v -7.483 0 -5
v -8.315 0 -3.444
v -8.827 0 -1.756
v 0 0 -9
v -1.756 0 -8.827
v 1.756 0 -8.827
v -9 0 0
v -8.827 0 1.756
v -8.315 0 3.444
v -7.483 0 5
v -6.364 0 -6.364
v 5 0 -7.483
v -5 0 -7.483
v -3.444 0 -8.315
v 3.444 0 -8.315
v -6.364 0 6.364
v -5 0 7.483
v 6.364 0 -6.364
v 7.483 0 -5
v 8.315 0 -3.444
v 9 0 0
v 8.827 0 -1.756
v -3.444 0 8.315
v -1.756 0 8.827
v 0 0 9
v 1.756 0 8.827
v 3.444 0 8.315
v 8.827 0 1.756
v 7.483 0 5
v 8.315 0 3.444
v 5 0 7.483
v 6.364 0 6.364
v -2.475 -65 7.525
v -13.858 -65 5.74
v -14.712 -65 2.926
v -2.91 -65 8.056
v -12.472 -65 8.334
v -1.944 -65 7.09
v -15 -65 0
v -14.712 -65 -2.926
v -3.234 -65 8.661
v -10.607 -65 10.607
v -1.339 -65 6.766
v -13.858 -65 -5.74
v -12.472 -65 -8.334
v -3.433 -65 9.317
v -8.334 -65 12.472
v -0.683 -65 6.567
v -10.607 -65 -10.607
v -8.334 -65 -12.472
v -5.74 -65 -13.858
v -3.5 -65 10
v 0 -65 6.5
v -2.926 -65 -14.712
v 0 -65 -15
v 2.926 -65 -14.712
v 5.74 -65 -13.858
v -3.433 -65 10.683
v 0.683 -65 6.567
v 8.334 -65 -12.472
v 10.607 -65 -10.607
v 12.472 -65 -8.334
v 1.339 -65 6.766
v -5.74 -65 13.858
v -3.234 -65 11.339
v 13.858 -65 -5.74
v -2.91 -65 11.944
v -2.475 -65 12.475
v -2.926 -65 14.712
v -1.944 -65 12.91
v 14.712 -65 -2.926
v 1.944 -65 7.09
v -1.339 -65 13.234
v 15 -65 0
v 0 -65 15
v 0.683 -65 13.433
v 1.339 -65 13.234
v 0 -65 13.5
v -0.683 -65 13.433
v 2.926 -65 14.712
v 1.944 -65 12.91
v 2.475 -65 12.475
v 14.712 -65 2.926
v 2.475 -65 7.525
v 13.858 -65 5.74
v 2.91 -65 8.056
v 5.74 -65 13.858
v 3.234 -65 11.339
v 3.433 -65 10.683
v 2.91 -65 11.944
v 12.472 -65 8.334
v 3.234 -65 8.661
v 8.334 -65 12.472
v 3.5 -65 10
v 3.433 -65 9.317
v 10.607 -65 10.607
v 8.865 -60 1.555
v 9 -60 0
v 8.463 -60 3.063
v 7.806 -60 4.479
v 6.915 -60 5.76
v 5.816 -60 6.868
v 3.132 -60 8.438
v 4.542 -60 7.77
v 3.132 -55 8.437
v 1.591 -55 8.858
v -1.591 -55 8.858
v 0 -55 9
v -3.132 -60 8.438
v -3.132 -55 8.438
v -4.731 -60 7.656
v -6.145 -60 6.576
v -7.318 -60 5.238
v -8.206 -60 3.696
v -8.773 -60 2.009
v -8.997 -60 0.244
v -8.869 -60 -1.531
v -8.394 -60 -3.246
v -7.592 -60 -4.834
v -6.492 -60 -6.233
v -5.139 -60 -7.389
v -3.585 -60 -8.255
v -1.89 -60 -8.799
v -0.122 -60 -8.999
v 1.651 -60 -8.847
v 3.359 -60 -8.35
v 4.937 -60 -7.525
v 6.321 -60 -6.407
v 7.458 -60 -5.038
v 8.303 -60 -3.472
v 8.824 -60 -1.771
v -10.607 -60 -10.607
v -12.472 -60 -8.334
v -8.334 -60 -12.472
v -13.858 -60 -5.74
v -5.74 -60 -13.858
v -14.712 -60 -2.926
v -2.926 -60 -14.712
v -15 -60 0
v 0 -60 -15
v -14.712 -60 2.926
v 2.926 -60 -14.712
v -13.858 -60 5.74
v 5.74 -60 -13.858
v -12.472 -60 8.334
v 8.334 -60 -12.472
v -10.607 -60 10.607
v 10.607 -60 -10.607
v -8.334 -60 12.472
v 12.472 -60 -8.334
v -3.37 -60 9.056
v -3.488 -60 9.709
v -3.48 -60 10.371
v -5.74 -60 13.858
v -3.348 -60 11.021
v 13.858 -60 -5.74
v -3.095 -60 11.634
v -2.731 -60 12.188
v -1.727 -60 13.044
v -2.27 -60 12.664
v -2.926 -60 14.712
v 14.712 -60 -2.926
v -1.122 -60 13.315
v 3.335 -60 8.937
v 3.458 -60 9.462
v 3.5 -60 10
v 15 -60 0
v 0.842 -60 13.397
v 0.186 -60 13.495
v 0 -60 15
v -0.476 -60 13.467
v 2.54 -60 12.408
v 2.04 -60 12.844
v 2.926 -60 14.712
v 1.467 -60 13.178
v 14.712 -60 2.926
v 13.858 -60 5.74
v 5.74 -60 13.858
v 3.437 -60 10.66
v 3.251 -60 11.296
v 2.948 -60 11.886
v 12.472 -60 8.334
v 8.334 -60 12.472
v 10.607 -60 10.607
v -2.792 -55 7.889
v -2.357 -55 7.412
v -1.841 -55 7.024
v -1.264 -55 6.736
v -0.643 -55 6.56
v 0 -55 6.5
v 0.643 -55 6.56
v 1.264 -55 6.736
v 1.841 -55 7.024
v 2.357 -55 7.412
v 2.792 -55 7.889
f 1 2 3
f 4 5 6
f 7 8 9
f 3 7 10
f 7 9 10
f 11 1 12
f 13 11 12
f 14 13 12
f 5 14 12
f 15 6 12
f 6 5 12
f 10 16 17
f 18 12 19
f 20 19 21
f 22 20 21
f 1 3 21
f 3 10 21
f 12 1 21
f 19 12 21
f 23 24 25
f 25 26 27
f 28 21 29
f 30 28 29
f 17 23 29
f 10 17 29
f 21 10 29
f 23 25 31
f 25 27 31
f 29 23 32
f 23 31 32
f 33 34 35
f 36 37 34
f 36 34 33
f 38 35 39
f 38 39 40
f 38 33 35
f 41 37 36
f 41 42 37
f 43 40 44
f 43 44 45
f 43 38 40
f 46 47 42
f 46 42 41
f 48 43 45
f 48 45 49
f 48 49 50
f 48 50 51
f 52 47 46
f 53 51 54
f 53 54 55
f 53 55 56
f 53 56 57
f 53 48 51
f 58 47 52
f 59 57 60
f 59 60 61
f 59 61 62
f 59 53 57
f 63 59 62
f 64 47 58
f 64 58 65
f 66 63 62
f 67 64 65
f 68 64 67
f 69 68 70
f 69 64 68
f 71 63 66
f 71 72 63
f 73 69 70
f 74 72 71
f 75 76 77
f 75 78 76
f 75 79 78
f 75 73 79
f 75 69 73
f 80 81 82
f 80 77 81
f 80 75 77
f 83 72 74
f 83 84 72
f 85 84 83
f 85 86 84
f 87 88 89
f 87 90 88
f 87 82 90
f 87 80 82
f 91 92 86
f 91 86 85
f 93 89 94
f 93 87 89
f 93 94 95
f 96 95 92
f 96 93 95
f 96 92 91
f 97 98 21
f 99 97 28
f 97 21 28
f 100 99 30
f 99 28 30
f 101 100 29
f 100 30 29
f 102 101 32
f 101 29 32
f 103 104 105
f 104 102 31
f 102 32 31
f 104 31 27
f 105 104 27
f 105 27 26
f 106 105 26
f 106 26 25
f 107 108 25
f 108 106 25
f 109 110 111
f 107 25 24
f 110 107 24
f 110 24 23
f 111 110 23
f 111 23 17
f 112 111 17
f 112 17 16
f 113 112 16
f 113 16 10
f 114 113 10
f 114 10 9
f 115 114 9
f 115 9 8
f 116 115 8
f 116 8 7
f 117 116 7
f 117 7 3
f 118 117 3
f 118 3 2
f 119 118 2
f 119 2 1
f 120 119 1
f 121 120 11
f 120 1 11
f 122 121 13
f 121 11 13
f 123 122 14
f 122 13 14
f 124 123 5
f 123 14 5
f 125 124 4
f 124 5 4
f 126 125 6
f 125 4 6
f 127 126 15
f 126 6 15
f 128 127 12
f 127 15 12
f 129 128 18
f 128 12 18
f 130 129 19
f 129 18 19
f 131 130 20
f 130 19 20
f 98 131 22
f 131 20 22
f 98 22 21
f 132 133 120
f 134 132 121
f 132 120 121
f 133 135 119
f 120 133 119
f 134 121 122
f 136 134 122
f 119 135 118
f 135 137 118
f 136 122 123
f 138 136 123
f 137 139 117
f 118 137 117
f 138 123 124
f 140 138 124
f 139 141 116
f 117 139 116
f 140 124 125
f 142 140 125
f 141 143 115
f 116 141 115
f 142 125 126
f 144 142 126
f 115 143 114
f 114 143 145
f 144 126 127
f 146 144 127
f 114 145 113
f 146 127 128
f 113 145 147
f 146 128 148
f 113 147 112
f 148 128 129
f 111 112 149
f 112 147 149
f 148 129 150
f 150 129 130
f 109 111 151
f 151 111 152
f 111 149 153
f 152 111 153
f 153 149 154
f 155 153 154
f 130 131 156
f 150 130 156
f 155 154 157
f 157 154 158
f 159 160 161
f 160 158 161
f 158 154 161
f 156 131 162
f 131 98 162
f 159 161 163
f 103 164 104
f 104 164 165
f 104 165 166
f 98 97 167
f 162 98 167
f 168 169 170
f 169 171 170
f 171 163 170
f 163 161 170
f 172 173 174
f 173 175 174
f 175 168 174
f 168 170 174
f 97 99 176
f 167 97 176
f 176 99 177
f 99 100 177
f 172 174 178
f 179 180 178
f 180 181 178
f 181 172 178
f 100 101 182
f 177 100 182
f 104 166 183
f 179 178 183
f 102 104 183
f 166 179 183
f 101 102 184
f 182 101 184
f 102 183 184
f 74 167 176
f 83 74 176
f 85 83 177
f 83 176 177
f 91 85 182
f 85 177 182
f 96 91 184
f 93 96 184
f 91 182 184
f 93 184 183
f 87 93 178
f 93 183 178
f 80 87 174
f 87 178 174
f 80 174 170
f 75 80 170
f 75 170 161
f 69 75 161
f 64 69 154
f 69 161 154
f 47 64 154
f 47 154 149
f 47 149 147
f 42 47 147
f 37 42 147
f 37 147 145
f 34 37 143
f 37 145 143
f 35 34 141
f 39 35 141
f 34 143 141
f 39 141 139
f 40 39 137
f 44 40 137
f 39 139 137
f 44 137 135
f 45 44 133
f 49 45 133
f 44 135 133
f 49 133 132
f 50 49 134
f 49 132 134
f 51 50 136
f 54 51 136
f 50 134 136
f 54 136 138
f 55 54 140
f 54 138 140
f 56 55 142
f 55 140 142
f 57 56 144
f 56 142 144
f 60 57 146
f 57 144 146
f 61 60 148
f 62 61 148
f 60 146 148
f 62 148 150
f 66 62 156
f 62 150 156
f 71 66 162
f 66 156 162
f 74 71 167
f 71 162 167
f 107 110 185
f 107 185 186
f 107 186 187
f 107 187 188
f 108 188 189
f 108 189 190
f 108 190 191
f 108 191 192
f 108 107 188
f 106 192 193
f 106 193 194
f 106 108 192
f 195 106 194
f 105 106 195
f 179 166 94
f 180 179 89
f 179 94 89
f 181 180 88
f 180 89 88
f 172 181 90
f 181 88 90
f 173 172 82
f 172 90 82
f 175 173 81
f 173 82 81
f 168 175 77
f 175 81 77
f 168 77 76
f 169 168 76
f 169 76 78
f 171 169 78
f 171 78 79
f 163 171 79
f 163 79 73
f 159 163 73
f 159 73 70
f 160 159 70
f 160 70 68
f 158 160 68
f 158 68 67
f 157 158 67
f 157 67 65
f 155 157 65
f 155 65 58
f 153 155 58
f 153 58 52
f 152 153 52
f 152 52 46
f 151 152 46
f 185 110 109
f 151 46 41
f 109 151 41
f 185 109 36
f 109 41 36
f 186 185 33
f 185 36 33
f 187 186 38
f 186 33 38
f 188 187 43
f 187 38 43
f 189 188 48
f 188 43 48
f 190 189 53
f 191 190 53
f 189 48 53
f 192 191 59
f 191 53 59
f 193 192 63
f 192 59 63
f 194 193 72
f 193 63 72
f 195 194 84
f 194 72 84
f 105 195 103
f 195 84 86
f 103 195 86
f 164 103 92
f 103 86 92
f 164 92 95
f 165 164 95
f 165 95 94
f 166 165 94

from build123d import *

# Parameters (mm, degrees)
F0_R     = 9
F1_DEPTH = 60
F2_R     = 15
F2_R_2   = 9
F3_DEPTH = 5
F4_R     = 3.5
F5_DEPTH = 10


with BuildPart() as f1:
    # F0 (on Front) → F1 (new body)
    with BuildSketch(Plane.XZ):
        Circle(F0_R)
    extrude(amount=F1_DEPTH)

    # F2 (on face) → F3 (join)
    with BuildSketch(Plane.XZ.offset(60)):
        Circle(F2_R)
        Circle(F2_R_2, mode=Mode.SUBTRACT)
        Circle(F2_R_2)
    extrude(amount=F3_DEPTH)

    # F4 (on face) → F5 (cut)
    with BuildSketch(Plane.XZ.offset(65)):
        with Locations((0, 10)):
            Circle(F4_R)
    extrude(amount=-F5_DEPTH, mode=Mode.SUBTRACT)


solid = f1.part
